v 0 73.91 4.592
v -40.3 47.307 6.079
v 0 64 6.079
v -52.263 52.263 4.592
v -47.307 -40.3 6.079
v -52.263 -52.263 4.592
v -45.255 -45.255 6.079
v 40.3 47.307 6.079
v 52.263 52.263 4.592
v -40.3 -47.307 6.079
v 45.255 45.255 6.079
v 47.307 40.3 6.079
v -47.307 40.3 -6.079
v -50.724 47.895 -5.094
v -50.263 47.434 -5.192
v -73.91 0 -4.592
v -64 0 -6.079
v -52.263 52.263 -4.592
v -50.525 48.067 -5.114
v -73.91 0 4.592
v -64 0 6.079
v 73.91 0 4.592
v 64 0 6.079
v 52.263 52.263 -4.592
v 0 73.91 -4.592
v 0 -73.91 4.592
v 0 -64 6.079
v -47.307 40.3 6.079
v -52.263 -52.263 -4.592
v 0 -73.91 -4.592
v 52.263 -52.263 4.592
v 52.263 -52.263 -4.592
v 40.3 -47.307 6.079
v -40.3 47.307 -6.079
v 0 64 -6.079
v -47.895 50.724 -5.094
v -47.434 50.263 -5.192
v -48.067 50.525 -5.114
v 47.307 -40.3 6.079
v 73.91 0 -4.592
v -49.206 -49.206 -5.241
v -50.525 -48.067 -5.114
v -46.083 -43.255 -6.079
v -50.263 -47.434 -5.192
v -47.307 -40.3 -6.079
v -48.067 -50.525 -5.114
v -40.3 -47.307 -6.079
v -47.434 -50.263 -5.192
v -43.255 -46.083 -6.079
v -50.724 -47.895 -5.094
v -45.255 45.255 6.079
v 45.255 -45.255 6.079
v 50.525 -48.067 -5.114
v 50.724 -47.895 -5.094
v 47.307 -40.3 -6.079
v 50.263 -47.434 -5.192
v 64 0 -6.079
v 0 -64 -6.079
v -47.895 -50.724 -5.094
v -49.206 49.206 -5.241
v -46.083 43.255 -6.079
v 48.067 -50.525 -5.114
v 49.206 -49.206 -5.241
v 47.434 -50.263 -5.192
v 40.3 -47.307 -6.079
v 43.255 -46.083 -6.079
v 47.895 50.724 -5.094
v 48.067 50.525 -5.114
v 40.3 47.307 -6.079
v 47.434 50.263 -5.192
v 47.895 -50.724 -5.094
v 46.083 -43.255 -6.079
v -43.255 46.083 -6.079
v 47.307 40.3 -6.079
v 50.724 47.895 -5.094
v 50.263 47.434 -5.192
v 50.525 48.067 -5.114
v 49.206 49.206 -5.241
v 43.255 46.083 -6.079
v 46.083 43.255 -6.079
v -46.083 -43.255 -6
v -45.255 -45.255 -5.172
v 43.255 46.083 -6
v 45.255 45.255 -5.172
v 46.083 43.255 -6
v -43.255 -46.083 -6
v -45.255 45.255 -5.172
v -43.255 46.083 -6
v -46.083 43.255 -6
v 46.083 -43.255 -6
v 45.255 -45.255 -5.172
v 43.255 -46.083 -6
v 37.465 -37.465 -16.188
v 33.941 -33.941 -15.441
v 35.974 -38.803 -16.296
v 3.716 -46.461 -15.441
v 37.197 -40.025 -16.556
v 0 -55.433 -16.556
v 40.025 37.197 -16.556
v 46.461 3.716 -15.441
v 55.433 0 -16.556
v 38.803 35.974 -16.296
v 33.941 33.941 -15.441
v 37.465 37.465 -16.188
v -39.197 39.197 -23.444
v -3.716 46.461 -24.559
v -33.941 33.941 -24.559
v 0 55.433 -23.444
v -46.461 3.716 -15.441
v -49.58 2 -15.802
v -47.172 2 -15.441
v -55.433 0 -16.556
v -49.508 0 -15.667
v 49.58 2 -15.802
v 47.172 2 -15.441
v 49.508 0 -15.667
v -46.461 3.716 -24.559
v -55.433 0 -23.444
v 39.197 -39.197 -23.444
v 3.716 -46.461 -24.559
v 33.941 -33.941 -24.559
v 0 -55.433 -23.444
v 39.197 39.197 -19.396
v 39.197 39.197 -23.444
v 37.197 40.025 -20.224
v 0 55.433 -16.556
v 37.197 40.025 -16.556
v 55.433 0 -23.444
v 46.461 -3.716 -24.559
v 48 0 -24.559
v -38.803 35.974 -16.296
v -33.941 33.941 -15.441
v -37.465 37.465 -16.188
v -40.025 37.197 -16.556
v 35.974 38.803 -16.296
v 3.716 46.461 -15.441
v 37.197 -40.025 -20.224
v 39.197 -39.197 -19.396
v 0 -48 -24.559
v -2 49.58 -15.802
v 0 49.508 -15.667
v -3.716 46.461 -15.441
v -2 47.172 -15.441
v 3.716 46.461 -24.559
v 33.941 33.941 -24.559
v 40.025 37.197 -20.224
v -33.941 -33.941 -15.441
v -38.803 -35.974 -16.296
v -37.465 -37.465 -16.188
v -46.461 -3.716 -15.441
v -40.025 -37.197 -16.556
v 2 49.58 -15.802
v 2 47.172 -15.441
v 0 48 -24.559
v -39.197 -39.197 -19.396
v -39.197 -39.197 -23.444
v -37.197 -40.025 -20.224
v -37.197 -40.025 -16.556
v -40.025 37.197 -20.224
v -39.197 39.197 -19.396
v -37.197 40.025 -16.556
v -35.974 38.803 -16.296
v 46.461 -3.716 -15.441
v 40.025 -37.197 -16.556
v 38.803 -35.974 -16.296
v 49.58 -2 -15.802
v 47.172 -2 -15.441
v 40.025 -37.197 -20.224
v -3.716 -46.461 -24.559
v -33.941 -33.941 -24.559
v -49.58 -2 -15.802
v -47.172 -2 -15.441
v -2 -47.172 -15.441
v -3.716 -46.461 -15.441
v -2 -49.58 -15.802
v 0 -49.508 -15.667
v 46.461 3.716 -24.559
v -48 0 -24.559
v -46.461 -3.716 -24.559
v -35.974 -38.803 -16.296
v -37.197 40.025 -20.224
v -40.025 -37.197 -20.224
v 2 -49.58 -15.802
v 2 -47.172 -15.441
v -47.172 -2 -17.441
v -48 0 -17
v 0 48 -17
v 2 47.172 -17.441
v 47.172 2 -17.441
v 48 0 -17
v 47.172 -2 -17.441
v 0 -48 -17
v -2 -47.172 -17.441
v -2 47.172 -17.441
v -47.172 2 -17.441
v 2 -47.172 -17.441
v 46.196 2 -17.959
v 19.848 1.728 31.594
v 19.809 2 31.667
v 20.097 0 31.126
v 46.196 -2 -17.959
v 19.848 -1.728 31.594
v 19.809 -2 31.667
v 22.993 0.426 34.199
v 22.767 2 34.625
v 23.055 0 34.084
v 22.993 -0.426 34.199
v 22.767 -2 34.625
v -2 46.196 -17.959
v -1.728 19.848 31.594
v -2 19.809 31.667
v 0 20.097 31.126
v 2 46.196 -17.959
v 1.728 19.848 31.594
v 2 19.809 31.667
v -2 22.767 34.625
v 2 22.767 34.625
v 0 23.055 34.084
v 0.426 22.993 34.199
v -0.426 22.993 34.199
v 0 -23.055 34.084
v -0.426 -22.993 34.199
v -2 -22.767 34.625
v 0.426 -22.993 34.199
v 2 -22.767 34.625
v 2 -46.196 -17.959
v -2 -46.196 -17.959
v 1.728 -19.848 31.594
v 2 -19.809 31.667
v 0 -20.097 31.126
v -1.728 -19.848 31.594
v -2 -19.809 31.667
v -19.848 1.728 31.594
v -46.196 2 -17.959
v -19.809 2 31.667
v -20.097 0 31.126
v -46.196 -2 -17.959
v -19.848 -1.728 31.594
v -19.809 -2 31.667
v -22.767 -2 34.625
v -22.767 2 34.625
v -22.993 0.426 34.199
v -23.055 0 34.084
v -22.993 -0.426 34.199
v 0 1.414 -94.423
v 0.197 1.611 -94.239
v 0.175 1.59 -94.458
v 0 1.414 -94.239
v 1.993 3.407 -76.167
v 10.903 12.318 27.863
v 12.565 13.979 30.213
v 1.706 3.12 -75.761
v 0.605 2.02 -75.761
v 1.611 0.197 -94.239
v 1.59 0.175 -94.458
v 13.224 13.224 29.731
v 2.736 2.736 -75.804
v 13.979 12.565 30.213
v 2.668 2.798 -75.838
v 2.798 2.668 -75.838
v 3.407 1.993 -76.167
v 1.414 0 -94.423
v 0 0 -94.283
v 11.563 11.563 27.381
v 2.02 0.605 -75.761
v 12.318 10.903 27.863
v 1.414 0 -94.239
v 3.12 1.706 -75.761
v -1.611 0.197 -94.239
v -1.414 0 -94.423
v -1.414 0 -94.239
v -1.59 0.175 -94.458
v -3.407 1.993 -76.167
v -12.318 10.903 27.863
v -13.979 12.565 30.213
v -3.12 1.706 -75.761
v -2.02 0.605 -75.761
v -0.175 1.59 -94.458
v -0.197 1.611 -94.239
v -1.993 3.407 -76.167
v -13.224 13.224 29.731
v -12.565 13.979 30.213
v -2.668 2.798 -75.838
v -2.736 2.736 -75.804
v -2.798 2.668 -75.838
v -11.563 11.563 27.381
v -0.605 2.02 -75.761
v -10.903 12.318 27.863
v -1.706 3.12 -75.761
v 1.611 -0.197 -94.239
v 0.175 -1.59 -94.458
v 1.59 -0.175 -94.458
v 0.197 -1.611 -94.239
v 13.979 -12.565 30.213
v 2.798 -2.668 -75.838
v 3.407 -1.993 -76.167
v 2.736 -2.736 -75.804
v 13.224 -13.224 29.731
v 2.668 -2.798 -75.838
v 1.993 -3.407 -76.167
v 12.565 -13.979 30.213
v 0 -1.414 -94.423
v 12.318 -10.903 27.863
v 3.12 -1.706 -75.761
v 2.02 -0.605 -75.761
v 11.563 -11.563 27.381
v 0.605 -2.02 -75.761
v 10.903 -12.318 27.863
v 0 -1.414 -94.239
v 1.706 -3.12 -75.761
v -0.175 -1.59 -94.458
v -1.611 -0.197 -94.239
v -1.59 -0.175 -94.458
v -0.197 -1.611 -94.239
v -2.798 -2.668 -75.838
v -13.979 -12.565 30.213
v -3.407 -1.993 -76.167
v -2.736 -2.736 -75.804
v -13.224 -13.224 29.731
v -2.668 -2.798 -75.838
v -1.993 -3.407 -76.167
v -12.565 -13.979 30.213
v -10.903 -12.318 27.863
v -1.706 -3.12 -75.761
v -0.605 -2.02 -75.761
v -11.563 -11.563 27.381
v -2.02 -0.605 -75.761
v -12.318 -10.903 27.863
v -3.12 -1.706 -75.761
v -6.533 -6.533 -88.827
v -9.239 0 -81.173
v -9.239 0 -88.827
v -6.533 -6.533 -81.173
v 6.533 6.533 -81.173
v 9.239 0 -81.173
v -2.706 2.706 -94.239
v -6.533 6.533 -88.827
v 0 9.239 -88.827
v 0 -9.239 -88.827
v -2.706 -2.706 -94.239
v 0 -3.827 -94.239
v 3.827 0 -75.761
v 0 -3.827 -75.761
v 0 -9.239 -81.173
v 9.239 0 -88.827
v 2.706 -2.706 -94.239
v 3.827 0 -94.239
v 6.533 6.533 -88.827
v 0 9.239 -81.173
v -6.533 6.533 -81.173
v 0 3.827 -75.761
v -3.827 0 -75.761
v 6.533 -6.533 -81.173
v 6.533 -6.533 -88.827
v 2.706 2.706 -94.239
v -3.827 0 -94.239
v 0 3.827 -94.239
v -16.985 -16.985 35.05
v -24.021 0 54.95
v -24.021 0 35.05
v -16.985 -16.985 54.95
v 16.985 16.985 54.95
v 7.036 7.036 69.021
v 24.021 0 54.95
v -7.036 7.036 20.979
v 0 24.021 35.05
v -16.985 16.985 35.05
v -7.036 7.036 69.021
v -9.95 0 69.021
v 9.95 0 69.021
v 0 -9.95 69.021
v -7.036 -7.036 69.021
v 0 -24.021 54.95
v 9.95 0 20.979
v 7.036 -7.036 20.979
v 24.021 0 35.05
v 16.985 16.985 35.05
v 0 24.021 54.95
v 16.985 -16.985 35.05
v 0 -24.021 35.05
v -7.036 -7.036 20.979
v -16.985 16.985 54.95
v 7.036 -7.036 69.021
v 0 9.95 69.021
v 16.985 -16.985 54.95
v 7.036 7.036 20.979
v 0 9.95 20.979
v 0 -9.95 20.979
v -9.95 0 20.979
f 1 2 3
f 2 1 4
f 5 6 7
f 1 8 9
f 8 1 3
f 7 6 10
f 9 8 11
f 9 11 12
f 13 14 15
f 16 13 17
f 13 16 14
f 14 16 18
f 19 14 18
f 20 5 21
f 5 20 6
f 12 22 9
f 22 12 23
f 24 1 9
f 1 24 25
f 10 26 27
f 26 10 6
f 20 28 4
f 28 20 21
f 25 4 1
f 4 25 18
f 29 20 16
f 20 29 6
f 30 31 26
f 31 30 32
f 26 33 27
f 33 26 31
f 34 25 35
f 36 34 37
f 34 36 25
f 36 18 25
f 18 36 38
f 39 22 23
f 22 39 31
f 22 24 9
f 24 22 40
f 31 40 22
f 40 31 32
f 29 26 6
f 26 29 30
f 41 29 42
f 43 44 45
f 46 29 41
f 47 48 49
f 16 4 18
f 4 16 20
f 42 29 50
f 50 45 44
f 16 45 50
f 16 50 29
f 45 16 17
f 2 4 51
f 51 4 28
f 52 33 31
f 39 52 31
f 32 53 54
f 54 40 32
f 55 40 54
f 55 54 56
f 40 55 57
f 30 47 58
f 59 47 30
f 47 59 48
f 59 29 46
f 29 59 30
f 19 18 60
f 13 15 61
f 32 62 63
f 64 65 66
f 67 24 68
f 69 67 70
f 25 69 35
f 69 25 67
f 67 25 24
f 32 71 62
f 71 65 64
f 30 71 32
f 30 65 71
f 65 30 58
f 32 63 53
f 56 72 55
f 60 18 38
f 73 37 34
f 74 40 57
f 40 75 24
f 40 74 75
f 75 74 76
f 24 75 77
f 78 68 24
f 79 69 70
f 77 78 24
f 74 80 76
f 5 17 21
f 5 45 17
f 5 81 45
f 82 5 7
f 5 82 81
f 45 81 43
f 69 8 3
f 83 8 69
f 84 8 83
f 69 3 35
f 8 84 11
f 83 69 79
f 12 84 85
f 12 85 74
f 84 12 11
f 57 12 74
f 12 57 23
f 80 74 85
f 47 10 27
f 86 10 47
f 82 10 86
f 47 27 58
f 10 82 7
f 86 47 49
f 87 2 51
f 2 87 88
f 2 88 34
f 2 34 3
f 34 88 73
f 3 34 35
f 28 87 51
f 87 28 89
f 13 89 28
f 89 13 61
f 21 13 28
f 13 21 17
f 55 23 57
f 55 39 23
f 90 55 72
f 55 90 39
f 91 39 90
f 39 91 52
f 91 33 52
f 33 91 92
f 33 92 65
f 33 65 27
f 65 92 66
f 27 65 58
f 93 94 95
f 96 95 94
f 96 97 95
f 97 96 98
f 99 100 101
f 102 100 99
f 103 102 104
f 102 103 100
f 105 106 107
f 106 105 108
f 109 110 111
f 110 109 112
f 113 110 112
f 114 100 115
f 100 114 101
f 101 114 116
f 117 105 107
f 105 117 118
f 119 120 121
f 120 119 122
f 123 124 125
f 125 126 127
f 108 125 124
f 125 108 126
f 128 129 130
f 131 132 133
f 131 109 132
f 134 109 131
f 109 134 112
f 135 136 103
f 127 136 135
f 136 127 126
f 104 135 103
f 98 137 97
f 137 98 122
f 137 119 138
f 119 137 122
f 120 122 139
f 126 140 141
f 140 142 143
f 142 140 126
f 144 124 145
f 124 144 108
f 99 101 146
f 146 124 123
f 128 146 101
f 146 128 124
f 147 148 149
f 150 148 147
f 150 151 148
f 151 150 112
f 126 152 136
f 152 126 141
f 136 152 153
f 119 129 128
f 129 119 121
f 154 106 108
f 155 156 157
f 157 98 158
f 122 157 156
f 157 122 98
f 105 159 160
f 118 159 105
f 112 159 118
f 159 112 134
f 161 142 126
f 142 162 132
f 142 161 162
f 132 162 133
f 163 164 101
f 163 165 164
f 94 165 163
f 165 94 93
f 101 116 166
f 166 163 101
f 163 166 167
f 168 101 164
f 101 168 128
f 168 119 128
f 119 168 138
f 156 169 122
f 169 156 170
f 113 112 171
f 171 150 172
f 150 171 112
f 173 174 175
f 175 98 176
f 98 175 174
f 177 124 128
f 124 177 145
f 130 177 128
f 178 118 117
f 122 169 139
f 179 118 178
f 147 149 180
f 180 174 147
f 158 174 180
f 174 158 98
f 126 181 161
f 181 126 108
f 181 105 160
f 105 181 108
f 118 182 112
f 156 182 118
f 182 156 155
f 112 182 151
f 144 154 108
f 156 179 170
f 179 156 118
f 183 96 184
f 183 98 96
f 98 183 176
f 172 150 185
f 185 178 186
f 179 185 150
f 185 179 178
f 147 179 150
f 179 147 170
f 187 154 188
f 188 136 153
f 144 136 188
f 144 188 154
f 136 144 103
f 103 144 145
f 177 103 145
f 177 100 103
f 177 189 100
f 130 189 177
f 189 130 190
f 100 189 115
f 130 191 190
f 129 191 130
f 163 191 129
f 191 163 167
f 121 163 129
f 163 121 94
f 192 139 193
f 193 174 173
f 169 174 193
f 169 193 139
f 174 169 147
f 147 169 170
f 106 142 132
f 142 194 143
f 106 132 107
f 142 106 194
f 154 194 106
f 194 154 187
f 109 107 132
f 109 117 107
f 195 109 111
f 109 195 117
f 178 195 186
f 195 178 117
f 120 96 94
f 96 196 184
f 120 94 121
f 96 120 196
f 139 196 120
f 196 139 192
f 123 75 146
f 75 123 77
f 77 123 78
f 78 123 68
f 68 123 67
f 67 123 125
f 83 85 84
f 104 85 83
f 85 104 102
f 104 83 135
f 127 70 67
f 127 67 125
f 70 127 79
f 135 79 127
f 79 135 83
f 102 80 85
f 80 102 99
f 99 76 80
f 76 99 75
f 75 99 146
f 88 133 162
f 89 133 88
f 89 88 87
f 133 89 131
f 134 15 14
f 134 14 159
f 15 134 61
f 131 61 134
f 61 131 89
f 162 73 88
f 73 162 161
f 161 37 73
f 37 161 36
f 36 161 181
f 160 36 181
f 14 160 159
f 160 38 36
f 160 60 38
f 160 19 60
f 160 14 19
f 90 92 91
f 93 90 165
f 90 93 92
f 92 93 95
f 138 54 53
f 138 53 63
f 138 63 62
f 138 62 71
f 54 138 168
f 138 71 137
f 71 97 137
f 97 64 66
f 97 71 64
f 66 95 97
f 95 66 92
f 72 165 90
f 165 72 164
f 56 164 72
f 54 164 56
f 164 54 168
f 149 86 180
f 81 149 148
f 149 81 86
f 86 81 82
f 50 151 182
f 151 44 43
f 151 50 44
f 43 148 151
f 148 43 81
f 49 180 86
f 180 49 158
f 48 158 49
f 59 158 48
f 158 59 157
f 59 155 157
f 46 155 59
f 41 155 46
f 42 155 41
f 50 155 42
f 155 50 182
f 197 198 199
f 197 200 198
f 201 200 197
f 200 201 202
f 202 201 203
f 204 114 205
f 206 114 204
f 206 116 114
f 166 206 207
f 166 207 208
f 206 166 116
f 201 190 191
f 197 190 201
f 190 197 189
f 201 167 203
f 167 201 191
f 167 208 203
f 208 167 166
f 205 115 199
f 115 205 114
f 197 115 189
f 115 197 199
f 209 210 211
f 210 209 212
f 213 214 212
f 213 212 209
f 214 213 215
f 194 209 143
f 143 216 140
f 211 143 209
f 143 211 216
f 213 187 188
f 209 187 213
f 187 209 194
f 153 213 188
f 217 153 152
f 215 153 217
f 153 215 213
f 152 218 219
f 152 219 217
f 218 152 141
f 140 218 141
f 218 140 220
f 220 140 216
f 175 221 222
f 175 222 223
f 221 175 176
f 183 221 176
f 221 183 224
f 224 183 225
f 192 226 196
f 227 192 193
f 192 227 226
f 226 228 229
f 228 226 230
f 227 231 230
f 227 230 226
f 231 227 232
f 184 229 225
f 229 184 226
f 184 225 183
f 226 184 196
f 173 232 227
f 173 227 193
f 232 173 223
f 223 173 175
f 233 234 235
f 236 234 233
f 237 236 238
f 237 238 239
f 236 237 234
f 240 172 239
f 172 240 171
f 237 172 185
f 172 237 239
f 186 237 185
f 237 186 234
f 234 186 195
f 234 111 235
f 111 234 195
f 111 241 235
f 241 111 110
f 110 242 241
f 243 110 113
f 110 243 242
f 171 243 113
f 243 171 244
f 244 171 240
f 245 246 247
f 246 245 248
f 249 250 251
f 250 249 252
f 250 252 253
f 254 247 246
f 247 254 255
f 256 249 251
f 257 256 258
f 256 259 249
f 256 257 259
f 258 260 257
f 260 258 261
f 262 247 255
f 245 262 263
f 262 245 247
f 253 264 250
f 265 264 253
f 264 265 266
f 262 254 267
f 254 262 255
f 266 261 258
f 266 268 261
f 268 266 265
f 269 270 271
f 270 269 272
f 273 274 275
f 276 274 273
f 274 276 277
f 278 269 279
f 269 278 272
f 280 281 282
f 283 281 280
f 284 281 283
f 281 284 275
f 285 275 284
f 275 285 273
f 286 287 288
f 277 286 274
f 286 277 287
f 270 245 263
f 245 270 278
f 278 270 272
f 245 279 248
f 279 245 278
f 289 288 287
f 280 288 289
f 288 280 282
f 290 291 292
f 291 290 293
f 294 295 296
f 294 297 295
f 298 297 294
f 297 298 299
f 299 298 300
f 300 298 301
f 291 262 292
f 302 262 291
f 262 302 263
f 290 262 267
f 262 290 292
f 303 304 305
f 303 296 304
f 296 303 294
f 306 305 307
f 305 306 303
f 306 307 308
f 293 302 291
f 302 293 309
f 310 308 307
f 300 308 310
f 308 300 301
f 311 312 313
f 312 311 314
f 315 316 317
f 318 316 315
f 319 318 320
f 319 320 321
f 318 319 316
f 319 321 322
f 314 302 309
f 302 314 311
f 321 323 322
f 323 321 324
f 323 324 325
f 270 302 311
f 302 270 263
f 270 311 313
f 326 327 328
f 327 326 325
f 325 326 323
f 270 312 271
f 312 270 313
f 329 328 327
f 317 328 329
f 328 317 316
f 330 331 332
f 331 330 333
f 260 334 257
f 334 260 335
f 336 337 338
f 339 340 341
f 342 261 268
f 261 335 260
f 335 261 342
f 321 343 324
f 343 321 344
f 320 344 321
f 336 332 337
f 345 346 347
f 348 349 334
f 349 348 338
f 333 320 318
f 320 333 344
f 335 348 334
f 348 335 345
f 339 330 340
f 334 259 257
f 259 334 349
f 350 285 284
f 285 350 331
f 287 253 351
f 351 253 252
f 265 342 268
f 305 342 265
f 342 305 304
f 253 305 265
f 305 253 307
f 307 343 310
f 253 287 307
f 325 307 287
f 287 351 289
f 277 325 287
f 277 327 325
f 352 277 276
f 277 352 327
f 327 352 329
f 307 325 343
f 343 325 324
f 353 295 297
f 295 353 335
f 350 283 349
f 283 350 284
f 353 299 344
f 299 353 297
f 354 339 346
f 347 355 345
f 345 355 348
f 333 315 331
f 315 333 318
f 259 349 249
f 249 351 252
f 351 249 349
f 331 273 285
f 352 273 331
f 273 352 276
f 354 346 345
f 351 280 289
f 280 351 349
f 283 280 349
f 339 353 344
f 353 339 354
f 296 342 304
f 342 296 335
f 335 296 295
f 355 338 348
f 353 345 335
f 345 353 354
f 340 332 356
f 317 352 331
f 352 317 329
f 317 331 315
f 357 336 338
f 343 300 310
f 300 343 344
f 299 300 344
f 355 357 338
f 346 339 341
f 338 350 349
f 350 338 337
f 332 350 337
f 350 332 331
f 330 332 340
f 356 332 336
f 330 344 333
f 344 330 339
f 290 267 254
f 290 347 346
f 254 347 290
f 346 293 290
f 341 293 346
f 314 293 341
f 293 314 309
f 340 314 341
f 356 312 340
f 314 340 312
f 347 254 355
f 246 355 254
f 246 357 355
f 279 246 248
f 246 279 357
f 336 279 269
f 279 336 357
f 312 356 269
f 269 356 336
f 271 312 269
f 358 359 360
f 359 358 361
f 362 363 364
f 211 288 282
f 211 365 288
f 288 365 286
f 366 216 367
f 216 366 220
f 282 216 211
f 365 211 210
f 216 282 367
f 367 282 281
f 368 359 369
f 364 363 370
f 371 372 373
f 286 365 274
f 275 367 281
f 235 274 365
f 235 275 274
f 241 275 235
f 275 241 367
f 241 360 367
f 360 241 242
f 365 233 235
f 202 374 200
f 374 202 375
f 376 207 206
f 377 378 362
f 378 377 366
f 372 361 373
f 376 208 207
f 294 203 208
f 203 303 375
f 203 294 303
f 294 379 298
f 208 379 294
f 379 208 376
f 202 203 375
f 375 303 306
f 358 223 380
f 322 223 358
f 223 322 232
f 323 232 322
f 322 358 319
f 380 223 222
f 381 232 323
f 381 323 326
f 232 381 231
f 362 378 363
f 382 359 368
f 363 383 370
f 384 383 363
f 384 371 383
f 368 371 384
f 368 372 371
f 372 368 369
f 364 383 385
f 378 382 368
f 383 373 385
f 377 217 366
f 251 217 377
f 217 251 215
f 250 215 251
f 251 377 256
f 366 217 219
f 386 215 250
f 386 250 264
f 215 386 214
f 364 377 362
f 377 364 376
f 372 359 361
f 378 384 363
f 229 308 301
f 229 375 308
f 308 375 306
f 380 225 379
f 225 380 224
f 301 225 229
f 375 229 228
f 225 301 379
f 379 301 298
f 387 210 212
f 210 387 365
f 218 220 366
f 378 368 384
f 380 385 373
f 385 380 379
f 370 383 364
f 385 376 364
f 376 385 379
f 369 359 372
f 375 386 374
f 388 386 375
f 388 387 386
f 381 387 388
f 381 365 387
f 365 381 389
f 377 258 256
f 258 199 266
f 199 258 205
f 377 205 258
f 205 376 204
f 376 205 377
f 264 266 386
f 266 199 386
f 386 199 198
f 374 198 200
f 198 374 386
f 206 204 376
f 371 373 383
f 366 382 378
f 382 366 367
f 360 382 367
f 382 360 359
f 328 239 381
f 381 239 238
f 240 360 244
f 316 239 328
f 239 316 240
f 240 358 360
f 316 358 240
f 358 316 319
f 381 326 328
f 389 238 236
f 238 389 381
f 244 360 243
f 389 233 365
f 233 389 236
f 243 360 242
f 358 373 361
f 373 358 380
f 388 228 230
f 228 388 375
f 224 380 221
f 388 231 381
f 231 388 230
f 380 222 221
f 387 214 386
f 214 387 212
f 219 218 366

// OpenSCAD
$fn=8;

module ring(radius)
{
	difference() {
		scale(v = [1, 1, 0.15])
			sphere(r = radius);
		cylinder(h = radius * 2, r1 = radius * 0.8, r2 = radius * 0.8, center = true);
	}
}

module spoke(thickness, length, angle, displacement)
{
	translate(v = [displacement, 0, 0])
		rotate(a = angle, v = [0, 1, 0])
			cube(size = [thickness, thickness, length], center = true);
}

module spoke_set(thickness, length, angle, displacement)
{
	spoke(thickness, length, angle, displacement);
	rotate(a = 90, v = [0, 0, 1])
		spoke(thickness, length, angle, displacement);
	rotate(a = -90, v = [0, 0, 1])
		spoke(thickness, length, angle, displacement);
	rotate(a = 180, v = [0, 0, 1])
		spoke(thickness, length, angle, displacement);
}

union()
{
	ring(80);
	translate(v = [0, 0, -20])
		ring(60);
	translate(v = [0, 0, -13])
	rotate(a = 45, v = [0, 0, 1])
		spoke_set(4, 27, 45, 59);
	translate(v = [0, 0, 13])
	spoke_set(4, 68, -28, 32);
	rotate(a = 45, v = [0, 0, 1])
		translate(v = [0, 0, -25])
			spoke_set(2, 140, 8, 10);
	translate(v = [0, 0, -85])
		sphere(r = 10);
	translate(v = [0, 0, 45])
		sphere(r = 26);
}
